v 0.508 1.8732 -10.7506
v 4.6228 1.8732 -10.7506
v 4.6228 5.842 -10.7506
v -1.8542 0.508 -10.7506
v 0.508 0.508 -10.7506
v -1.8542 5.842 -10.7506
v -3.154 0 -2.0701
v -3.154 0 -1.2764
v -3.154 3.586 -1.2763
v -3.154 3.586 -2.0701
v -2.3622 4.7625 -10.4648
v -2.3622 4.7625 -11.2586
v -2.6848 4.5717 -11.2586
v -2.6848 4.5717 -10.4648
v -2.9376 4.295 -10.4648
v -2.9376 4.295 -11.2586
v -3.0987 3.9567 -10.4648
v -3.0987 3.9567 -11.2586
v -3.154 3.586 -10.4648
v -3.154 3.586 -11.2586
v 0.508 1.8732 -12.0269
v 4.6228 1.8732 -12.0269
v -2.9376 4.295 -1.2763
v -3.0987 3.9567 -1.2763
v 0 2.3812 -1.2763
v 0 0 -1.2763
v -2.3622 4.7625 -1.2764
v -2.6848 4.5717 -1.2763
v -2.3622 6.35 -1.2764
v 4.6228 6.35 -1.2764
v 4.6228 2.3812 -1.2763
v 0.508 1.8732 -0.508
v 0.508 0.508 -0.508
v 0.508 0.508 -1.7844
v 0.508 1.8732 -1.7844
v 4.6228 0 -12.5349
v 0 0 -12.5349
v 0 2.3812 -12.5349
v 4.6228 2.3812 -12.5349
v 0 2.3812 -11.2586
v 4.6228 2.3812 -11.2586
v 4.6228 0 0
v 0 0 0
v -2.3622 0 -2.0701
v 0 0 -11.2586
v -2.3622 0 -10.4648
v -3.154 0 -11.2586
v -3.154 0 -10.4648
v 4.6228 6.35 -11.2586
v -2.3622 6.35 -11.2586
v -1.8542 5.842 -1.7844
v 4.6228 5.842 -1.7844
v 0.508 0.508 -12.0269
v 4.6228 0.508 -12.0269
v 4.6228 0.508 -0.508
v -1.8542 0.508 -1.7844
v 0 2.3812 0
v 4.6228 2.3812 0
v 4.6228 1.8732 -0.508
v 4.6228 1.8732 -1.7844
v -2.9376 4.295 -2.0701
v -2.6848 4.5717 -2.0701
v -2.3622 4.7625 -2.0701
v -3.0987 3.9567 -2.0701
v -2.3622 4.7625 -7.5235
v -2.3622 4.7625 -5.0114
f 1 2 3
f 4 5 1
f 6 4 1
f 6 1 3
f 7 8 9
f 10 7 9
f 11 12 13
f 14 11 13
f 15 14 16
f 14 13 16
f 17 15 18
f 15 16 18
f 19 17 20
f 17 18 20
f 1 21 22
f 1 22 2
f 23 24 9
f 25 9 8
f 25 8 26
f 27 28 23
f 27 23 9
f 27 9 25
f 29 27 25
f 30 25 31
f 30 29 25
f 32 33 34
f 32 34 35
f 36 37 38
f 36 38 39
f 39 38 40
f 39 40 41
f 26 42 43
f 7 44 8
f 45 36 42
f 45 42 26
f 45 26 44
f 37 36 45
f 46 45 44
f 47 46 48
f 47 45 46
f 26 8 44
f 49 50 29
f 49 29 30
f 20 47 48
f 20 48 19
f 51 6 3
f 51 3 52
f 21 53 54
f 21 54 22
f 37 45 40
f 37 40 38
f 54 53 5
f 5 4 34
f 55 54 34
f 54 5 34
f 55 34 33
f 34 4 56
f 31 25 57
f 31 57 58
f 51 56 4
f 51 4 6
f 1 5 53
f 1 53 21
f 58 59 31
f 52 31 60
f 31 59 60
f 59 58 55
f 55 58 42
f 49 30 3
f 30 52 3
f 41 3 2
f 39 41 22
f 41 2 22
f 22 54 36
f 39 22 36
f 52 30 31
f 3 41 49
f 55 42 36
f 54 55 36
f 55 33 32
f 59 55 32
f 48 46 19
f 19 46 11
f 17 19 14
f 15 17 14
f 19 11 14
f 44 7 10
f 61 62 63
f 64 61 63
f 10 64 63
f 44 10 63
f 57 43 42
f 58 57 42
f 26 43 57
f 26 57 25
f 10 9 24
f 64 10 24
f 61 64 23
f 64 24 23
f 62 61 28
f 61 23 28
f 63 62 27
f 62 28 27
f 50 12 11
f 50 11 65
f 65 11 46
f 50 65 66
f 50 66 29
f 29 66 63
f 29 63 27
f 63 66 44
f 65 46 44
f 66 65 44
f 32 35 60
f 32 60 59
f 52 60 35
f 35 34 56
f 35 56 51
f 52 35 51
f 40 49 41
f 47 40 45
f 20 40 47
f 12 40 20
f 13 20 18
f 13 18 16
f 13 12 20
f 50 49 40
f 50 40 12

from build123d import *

# Parameters (mm, degrees)
SKETCH1_W           = 4.6228
SKETCH1_H           = 12.5349
BOSS_EXTRUDE1_DEPTH = 2.38125
BOSS_EXTRUDE2_DEPTH = 6.35
SKETCH3_W           = 0.791761441
SKETCH3_H           = 4.7625
BOSS_EXTRUDE3_DEPTH = 0.79375
SKETCH4_W           = 0.791761441
SKETCH4_H           = 4.7625
BOSS_EXTRUDE4_DEPTH = 0.79375
FILLET1_R           = 1.27
SHELL1_START        = -1.8542
SHELL1_OUTLINE_W    = 5.334
SHELL1_OUTLINE_H    = 8.9662
SHELL1_DEPTH        = 6.477
SHELL1_START_2      = 0.508
SHELL1_2_OUTLINE_W  = 1.36525
SHELL1_2_OUTLINE_H  = 1.27635
SHELL1_2_DEPTH      = 4.1148


# Read off the part's stored shape, not the designer's step: Shell1
with BuildPart() as part:
    # Sketch1 → Boss-Extrude1 (new body)
    with BuildSketch(Plane(origin=(0, 0, 0), x_dir=(1, 0, 0), z_dir=(0, 1, 0))):
        with Locations((2.3114, 6.26745)):
            Rectangle(SKETCH1_W, SKETCH1_H)
    extrude(amount=BOSS_EXTRUDE1_DEPTH)

    # Sketch2 → Boss-Extrude2 (add)
    with BuildSketch(Plane(origin=(0, 0, 0), x_dir=(-1, 0, 0), z_dir=(0, -1, 0))):
        Polygon((-4.6228, 6.26745), (-4.6228, 11.25855), (2.3622, 11.25855), (2.3622, 1.27635), (-4.6228, 1.27635), align=None)
    extrude(amount=-BOSS_EXTRUDE2_DEPTH)

    # Sketch3 → Boss-Extrude3 (add)
    with BuildSketch(Plane.XY.offset(-1.27635)):
        with Locations((-2.758080721, 2.38125)):
            Rectangle(SKETCH3_W, SKETCH3_H)
    extrude(amount=-BOSS_EXTRUDE3_DEPTH)

    # Sketch4 → Boss-Extrude4 (add)
    with BuildSketch(Plane(origin=(0, 0, -11.25855), x_dir=(-1, 0, 0), z_dir=(0, 0, -1))):
        with Locations((2.758080721, 2.38125)):
            Rectangle(SKETCH4_W, SKETCH4_H)
    extrude(amount=-BOSS_EXTRUDE4_DEPTH)

    # Fillet1
    # the kernel refuses this fillet: 1.27 mm, written as the material it takes off along each edge
    with BuildSketch(Plane(origin=(-3.153961441, 4.7625, 1.664937857), x_dir=(1, 0, 0), z_dir=(0, 0, -1))) as fillet1_piece_1:
        with BuildLine():
            CenterArc((1.27, 1.176515143), FILLET1_R, 180, 67.878878404)
            Line((0, 1.176515143), (-0.0254, 1.176515143))
            Line((-0.0254, 1.176515143), (-0.0254, 0))
            Line((-0.0254, 0), (0, -0.0254))
            ThreePointArc((0, -0.0254), (0.395880721, -0.0254), (0.78219667, -0.023530303))
            Line((0.78219667, -0.023530303), (0.791761441, 0))
        make_face()
    extrude(amount=6.676325713, mode=Mode.SUBTRACT)
    with BuildSketch(Plane(origin=(-3.153961441, 4.7625, -14.199837857), x_dir=(0, -1, 0), z_dir=(0, 0, 1))) as fillet1_piece_2:
        with BuildLine():
            CenterArc((1.176515143, 1.27), FILLET1_R, 202.121121596, 67.878878404)
            Line((0, 0.791761441), (-0.023530303, 0.78219667))
            ThreePointArc((-0.023530303, 0.78219667), (-0.0254, 0.395880721), (-0.0254, 0))
            Line((-0.0254, 0), (0, -0.0254))
            Line((0, -0.0254), (1.176515143, -0.0254))
            Line((1.176515143, -0.0254), (1.176515143, 0))
        make_face()
    extrude(amount=6.676325713, mode=Mode.SUBTRACT)

    # Shell1 outline → Shell1 (cut)
    with BuildSketch(Plane.YZ.offset(SHELL1_START)):
        with Locations((3.175, -6.26745)):
            Rectangle(SHELL1_OUTLINE_W, SHELL1_OUTLINE_H)
    extrude(amount=SHELL1_DEPTH, mode=Mode.SUBTRACT)

    # Shell1 2 outline → Shell1 2 (cut)
    with BuildSketch(Plane.YZ.offset(SHELL1_START_2)):
        with Locations((1.190625, -11.388725)):
            Rectangle(SHELL1_2_OUTLINE_W, SHELL1_2_OUTLINE_H)
        with Locations((1.190625, -1.146175)):
            Rectangle(SHELL1_2_OUTLINE_W, SHELL1_2_OUTLINE_H)
    extrude(amount=SHELL1_2_DEPTH, mode=Mode.SUBTRACT)


solid = part.part
